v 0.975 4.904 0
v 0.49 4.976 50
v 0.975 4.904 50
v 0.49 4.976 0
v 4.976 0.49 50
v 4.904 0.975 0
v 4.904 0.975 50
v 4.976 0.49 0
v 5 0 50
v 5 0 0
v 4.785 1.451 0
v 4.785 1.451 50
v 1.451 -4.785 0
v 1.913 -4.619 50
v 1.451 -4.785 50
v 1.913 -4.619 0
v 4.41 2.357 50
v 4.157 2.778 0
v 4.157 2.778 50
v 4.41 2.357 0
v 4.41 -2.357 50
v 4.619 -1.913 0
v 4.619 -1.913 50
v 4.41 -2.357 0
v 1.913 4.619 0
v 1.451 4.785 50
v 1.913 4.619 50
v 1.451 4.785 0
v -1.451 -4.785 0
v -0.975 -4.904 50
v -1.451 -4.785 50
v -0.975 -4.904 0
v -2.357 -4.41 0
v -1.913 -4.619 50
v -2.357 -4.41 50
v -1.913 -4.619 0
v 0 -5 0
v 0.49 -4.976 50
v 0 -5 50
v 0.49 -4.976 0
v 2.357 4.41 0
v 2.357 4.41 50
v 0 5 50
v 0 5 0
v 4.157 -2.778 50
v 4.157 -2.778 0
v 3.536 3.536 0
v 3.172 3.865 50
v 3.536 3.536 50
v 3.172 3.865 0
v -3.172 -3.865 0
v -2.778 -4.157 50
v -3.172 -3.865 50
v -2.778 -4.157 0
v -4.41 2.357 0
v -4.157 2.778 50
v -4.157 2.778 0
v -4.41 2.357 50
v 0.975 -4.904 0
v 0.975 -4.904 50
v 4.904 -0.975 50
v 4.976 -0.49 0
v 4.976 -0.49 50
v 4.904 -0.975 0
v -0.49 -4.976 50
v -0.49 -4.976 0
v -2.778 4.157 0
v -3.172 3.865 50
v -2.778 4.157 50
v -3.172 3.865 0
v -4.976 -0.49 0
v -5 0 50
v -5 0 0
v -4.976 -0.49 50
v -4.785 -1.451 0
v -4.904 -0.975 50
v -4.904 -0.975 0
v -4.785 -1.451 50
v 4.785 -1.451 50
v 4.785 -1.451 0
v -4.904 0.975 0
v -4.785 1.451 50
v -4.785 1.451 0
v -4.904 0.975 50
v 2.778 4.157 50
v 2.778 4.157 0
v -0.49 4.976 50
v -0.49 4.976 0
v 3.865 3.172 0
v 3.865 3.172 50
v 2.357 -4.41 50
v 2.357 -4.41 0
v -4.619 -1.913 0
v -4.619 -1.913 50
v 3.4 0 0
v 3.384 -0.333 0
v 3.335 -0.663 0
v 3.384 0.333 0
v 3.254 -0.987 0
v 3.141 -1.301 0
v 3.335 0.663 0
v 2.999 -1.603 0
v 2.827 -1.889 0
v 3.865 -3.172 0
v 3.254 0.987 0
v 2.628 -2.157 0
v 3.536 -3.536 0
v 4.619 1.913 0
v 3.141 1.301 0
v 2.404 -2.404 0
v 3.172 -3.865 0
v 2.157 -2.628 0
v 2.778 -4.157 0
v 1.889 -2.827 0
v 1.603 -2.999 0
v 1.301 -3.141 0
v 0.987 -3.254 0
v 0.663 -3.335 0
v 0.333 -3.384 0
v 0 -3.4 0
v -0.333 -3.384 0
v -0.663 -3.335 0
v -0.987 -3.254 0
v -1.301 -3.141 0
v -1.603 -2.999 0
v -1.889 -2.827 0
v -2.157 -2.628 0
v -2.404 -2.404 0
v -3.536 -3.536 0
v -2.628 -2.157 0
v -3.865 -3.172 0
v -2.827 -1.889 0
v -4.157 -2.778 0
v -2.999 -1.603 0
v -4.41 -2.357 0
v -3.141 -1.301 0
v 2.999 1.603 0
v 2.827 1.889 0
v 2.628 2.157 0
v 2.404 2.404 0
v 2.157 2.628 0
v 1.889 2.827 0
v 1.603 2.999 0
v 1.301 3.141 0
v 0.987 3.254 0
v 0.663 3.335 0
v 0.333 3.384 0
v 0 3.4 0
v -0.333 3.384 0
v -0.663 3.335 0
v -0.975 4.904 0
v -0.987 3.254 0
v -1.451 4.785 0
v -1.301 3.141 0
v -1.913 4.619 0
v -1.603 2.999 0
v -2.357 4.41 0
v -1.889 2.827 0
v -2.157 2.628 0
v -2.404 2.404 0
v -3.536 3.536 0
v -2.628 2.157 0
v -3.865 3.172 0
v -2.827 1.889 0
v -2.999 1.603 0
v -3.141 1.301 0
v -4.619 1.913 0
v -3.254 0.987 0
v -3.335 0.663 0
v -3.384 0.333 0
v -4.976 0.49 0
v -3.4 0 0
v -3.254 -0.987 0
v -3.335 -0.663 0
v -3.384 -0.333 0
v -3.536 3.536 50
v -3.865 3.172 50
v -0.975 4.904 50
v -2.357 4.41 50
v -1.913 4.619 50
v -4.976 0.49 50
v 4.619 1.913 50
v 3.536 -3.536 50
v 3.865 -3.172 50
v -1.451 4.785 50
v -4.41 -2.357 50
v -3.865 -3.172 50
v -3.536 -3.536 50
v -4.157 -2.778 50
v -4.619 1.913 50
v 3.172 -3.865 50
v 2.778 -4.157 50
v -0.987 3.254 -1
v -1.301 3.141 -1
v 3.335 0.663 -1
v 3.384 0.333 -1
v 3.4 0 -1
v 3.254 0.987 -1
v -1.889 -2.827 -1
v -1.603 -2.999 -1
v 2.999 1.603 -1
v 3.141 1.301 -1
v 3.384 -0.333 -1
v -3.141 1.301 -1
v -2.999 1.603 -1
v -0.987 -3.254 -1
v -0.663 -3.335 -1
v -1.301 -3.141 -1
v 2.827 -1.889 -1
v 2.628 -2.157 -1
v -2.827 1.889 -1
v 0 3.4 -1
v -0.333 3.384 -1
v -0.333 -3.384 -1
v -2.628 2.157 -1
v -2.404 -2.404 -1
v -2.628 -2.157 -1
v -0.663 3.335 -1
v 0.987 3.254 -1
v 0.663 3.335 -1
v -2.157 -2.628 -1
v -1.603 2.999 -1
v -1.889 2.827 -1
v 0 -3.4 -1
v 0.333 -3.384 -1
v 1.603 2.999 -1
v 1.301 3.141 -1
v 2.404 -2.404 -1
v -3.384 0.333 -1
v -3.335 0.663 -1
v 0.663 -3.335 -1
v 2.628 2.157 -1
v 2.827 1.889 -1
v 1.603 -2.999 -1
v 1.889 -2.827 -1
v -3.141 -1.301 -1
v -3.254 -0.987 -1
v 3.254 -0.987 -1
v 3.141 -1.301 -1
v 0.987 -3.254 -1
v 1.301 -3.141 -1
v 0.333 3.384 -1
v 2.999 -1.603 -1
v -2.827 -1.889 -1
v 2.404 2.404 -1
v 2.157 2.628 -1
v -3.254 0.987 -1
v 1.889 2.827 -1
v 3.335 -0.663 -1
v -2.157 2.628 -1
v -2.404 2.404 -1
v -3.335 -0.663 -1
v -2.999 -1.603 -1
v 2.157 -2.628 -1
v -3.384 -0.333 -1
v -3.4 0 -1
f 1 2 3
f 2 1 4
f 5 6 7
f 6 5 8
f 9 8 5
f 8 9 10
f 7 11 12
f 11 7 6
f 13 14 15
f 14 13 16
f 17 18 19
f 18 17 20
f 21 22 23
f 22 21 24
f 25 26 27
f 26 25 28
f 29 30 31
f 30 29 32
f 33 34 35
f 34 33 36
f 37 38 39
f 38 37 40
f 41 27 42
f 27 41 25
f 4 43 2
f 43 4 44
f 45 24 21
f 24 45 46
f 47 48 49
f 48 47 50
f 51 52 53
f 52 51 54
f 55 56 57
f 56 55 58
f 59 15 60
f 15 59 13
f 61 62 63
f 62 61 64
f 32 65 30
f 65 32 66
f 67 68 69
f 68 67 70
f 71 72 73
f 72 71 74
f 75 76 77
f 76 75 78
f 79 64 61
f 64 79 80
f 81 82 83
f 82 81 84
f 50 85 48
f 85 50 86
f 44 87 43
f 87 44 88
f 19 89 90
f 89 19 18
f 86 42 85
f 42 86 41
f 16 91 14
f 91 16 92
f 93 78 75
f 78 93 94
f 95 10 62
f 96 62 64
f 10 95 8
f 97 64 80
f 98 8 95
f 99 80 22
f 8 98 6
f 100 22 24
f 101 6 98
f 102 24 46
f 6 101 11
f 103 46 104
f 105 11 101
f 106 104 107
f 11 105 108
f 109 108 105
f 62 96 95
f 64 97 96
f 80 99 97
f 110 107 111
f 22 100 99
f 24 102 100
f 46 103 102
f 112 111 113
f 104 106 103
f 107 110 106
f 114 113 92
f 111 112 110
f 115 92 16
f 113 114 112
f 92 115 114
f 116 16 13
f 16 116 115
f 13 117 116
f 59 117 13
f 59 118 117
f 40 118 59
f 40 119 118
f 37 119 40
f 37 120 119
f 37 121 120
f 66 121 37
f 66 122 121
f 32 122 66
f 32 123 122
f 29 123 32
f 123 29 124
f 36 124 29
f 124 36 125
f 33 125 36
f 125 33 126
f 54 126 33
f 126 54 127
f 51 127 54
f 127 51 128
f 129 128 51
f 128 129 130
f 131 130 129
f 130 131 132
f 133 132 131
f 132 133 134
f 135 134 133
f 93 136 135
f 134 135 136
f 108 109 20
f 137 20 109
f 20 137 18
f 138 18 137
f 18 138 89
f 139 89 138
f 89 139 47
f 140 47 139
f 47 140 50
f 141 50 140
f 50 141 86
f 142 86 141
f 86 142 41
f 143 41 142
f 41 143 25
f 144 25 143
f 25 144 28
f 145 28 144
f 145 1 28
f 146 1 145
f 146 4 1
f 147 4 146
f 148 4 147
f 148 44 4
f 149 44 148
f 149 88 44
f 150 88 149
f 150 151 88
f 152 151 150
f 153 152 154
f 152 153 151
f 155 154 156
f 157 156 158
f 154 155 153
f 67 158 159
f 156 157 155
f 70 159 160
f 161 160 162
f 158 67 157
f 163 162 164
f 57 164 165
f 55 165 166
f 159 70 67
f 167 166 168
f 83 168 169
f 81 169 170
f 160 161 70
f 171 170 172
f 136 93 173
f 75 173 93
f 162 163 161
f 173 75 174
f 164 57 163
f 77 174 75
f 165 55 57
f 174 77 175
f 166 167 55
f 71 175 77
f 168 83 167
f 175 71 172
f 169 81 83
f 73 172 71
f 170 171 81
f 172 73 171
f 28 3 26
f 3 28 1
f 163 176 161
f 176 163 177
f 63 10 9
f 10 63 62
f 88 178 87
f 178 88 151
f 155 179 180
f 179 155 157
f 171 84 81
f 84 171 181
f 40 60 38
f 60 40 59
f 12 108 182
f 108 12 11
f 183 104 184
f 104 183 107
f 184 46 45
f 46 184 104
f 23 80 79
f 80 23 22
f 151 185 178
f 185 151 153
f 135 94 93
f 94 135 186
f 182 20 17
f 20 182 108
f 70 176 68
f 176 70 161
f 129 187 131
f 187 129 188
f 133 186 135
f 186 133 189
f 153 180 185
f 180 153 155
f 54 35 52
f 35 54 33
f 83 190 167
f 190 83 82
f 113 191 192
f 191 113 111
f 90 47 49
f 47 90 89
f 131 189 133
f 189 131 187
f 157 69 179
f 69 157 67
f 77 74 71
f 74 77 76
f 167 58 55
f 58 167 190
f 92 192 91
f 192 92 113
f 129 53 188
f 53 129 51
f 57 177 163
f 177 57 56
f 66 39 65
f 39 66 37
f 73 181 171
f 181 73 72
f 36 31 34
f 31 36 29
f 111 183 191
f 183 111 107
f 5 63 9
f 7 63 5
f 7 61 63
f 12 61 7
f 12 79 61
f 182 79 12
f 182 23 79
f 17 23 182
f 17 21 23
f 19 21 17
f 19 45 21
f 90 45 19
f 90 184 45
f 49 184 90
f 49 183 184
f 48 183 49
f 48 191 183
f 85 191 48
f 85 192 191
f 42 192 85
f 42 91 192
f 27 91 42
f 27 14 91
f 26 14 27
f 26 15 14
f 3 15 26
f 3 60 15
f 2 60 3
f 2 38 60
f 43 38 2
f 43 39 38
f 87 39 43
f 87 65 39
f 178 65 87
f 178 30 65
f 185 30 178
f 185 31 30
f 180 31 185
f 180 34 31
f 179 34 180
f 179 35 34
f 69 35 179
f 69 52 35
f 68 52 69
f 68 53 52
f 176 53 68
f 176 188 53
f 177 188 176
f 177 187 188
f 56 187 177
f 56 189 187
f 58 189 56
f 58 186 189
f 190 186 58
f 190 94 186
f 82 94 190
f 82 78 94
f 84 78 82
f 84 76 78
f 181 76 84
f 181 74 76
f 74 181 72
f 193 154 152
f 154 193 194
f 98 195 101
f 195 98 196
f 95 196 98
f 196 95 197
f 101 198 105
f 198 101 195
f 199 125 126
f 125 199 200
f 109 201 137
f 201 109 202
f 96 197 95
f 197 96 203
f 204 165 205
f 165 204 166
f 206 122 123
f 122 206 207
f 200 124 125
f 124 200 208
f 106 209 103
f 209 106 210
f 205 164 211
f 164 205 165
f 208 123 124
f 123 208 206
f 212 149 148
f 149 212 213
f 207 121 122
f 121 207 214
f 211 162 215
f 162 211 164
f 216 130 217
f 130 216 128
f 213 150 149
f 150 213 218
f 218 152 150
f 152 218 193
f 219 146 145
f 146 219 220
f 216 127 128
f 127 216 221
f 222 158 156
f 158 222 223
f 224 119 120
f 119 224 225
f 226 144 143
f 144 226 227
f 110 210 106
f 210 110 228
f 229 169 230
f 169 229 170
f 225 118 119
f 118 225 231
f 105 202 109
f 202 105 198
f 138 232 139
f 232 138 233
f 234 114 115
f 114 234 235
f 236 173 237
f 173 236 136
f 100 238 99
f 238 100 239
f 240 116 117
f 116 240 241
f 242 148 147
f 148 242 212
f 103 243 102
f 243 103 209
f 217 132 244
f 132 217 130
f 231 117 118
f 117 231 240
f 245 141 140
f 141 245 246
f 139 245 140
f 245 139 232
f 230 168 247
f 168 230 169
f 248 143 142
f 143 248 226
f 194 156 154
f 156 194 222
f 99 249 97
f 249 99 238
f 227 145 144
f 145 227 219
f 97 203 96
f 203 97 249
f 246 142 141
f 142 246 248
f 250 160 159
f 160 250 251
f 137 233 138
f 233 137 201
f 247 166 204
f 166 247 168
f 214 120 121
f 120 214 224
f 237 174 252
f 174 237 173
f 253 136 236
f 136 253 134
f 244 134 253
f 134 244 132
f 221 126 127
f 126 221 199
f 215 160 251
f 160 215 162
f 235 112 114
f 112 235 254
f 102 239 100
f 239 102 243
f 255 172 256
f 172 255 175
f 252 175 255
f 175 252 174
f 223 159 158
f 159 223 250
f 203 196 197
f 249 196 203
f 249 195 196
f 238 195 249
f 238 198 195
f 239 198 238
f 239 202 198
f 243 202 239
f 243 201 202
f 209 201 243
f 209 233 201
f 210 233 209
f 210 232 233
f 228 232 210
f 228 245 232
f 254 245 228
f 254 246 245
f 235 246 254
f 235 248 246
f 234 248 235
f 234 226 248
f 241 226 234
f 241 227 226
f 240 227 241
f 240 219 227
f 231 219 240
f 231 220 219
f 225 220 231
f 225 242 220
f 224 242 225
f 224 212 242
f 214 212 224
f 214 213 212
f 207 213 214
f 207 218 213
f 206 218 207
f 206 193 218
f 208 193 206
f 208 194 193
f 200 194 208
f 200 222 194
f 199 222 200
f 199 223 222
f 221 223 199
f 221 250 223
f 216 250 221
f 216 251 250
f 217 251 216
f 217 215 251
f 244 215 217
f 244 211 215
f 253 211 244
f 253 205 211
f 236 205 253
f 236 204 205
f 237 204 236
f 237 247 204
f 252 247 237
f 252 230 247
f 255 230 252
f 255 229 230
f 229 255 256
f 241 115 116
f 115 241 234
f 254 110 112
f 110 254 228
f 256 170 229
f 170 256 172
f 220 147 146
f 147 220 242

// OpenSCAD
// Lab funnel - printed upright, wide opening at the top, open at both ends
// Units: mm. Straight spout (tube) from z = 0 to z = 20, then a cone
// widens to a 60 mm rim at z = 50. Wall thickness 1.6 mm everywhere.

$fn = 64;

// ---- Dimensions ----
spout_od      = 10;    // spout outer diameter
spout_id      = spout_od - 2 * 1.6;  // spout bore (6.8 mm)
spout_length  = 20;    // spout top height (z = 20)
cone_top_d    = 60;     // cone rim outer diameter (z = 50)
cone_bottom_d = spout_od;  // cone base outer diameter, matched to spout (z = 20)
cone_height   = 50 - 20;  // cone height (30 mm)
wall          = 1.6;

// ---- Model ----
union() {
    // Spout: cylinder 10 mm OD from z = 0 to z = 20
    translate([0, 0, 0])
        cylinder(h = spout_length, d = spout_od);

    // Cone: 10 mm OD at z = 20 widening to 60 mm OD at z = 50
    translate([0, 0, spout_length])
        linear_extrude(height = cone_height)
            circle(d = cone_bottom_d);
}

difference() {
    // Bore through the spout (6.8 mm)
    translate([0, 0, -1])
        cylinder(h = spout_length + 2, d = spout_id);

    // Open top rim, cut 0.5 mm above the top face
    translate([0, 0, spout_length + cone_height - 0.5])
        cylinder(h = 1, d = cone_top_d);
}
